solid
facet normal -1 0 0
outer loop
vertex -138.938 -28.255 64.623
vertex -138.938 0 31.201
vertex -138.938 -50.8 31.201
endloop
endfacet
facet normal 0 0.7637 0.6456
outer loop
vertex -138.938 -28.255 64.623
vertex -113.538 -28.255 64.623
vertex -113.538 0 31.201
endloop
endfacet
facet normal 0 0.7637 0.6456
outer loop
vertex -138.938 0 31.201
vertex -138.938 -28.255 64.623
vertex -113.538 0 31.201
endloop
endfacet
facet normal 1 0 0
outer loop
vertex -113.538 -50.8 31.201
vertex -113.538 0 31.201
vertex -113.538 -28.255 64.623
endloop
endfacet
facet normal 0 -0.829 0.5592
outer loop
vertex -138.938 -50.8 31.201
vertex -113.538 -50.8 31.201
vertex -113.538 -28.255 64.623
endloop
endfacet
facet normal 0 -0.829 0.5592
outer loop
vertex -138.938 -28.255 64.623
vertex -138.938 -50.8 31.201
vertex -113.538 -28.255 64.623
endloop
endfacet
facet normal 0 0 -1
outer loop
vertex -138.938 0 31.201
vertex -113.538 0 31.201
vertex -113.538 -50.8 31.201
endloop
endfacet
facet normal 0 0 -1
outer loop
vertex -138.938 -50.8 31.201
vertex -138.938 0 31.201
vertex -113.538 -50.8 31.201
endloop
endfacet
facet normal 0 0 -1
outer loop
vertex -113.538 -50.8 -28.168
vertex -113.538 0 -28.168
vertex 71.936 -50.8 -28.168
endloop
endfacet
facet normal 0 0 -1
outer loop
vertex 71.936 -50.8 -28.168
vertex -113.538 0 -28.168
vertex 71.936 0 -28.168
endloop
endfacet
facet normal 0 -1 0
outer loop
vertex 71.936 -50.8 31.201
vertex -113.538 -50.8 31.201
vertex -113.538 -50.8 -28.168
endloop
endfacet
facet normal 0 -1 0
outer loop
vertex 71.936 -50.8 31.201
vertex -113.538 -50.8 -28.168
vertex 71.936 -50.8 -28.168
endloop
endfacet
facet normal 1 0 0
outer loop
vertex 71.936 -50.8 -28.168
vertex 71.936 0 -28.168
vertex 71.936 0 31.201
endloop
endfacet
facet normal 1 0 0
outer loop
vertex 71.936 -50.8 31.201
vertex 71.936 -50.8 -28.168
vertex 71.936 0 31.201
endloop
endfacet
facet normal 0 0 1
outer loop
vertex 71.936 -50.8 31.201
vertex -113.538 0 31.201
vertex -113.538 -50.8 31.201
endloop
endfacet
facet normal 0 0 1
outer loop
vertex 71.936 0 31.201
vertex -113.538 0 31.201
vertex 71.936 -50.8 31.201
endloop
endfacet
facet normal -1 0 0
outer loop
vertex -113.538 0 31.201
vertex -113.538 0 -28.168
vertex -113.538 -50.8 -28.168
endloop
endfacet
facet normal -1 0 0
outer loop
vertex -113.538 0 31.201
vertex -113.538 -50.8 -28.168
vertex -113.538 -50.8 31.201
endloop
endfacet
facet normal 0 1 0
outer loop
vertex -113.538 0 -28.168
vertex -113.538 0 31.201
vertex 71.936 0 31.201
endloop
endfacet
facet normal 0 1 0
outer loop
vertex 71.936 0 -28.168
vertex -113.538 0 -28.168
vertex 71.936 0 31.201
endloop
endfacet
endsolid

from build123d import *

# Parameters (mm, degrees)
F0_W     = 185.474456
F0_H     = 59.369163
F1_DEPTH = 50.8
F3_DEPTH = 25.4


with BuildPart() as f1:
    # F0 (on Front) → F1 (new body)
    with BuildSketch(Plane.XZ):
        with Locations((-20.800881, 1.51673)):
            Rectangle(F0_W, F0_H)
    extrude(amount=F1_DEPTH)


with BuildPart() as f3:
    # F2 (on face) → F3 (new body)
    with BuildSketch(Plane(origin=(-113.538109, 0, 0), x_dir=(0, -1, 0), z_dir=(-1, 0, 0))):
        Polygon((28.255278, 64.62346), (0, 31.201312), (50.8, 31.201312), align=None)
    extrude(amount=F3_DEPTH)


solid = Compound([f1.part, f3.part])
